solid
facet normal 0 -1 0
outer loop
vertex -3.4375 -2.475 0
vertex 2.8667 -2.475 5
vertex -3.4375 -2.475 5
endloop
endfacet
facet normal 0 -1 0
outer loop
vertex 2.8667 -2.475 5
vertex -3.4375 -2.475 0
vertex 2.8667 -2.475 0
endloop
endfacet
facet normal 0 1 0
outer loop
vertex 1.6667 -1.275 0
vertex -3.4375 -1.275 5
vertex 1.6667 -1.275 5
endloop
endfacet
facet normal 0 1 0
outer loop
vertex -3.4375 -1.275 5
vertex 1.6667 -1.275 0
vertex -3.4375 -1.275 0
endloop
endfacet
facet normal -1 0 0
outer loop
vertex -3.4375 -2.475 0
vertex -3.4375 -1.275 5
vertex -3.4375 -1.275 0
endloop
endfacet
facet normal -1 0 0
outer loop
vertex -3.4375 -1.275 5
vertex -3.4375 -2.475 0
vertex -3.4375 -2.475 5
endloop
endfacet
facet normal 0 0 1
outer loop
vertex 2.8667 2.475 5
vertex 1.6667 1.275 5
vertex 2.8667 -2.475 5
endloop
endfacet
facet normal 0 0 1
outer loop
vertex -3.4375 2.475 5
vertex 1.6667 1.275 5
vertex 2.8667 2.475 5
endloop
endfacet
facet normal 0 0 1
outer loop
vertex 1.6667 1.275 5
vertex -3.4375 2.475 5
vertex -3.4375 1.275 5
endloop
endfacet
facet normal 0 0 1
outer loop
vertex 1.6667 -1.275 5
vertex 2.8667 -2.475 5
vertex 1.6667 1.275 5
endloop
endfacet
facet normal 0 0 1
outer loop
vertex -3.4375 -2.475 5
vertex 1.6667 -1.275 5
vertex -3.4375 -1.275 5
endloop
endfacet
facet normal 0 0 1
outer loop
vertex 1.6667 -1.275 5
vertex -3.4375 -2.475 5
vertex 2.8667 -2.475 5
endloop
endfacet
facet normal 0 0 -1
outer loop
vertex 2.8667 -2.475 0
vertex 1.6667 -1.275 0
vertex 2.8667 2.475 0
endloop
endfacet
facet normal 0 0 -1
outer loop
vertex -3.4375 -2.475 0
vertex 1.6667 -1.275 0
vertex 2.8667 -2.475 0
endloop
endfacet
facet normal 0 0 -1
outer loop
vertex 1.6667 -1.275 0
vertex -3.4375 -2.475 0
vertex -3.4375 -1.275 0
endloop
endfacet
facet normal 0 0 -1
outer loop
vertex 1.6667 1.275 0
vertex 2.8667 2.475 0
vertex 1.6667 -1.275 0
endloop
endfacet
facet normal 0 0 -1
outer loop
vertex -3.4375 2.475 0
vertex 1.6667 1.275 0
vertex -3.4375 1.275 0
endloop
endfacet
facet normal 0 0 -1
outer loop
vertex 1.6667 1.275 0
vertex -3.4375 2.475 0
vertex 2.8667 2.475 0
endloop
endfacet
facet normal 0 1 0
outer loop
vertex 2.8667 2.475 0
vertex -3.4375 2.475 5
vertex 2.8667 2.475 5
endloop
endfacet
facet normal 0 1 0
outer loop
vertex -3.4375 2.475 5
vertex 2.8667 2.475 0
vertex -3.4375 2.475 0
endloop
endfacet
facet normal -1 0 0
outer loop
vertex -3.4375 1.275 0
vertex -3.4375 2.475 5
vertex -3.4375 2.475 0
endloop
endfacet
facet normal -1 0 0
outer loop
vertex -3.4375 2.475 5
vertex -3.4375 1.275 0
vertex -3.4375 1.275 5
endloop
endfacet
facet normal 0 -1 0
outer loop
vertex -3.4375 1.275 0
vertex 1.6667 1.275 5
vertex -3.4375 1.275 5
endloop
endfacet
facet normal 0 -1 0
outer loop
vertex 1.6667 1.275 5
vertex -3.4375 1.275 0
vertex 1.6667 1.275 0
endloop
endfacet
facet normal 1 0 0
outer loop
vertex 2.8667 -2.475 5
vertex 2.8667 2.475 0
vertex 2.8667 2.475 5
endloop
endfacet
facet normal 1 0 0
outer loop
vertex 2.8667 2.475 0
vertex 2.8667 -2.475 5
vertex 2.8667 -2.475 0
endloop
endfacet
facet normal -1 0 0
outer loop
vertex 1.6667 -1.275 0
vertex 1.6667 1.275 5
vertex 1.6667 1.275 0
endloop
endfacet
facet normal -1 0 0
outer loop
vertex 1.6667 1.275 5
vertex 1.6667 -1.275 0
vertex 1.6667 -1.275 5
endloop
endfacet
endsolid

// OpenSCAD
//cyntia vilte 13 de Octubre gancho para sujetar al clip en un extremo

radio_mayor=2.5;
z1=1.2;

module gancho()
{
 translate([0,0,radio_mayor])   
  rotate([90,0,0]) 
  union()
 {
  for(i=[0:1])
   rotate([i*180,0,0])   
    translate([-0.5,0,z1+z1/2+0.075])   
     cube([radio_mayor*1.75+1.5,radio_mayor*2,z1],center=true);
   translate([radio_mayor/1.5+z1/2,0,0])
    cube([z1,radio_mayor*2,z1*3+z1+0.15],center=true);  
 }
}
gancho();
